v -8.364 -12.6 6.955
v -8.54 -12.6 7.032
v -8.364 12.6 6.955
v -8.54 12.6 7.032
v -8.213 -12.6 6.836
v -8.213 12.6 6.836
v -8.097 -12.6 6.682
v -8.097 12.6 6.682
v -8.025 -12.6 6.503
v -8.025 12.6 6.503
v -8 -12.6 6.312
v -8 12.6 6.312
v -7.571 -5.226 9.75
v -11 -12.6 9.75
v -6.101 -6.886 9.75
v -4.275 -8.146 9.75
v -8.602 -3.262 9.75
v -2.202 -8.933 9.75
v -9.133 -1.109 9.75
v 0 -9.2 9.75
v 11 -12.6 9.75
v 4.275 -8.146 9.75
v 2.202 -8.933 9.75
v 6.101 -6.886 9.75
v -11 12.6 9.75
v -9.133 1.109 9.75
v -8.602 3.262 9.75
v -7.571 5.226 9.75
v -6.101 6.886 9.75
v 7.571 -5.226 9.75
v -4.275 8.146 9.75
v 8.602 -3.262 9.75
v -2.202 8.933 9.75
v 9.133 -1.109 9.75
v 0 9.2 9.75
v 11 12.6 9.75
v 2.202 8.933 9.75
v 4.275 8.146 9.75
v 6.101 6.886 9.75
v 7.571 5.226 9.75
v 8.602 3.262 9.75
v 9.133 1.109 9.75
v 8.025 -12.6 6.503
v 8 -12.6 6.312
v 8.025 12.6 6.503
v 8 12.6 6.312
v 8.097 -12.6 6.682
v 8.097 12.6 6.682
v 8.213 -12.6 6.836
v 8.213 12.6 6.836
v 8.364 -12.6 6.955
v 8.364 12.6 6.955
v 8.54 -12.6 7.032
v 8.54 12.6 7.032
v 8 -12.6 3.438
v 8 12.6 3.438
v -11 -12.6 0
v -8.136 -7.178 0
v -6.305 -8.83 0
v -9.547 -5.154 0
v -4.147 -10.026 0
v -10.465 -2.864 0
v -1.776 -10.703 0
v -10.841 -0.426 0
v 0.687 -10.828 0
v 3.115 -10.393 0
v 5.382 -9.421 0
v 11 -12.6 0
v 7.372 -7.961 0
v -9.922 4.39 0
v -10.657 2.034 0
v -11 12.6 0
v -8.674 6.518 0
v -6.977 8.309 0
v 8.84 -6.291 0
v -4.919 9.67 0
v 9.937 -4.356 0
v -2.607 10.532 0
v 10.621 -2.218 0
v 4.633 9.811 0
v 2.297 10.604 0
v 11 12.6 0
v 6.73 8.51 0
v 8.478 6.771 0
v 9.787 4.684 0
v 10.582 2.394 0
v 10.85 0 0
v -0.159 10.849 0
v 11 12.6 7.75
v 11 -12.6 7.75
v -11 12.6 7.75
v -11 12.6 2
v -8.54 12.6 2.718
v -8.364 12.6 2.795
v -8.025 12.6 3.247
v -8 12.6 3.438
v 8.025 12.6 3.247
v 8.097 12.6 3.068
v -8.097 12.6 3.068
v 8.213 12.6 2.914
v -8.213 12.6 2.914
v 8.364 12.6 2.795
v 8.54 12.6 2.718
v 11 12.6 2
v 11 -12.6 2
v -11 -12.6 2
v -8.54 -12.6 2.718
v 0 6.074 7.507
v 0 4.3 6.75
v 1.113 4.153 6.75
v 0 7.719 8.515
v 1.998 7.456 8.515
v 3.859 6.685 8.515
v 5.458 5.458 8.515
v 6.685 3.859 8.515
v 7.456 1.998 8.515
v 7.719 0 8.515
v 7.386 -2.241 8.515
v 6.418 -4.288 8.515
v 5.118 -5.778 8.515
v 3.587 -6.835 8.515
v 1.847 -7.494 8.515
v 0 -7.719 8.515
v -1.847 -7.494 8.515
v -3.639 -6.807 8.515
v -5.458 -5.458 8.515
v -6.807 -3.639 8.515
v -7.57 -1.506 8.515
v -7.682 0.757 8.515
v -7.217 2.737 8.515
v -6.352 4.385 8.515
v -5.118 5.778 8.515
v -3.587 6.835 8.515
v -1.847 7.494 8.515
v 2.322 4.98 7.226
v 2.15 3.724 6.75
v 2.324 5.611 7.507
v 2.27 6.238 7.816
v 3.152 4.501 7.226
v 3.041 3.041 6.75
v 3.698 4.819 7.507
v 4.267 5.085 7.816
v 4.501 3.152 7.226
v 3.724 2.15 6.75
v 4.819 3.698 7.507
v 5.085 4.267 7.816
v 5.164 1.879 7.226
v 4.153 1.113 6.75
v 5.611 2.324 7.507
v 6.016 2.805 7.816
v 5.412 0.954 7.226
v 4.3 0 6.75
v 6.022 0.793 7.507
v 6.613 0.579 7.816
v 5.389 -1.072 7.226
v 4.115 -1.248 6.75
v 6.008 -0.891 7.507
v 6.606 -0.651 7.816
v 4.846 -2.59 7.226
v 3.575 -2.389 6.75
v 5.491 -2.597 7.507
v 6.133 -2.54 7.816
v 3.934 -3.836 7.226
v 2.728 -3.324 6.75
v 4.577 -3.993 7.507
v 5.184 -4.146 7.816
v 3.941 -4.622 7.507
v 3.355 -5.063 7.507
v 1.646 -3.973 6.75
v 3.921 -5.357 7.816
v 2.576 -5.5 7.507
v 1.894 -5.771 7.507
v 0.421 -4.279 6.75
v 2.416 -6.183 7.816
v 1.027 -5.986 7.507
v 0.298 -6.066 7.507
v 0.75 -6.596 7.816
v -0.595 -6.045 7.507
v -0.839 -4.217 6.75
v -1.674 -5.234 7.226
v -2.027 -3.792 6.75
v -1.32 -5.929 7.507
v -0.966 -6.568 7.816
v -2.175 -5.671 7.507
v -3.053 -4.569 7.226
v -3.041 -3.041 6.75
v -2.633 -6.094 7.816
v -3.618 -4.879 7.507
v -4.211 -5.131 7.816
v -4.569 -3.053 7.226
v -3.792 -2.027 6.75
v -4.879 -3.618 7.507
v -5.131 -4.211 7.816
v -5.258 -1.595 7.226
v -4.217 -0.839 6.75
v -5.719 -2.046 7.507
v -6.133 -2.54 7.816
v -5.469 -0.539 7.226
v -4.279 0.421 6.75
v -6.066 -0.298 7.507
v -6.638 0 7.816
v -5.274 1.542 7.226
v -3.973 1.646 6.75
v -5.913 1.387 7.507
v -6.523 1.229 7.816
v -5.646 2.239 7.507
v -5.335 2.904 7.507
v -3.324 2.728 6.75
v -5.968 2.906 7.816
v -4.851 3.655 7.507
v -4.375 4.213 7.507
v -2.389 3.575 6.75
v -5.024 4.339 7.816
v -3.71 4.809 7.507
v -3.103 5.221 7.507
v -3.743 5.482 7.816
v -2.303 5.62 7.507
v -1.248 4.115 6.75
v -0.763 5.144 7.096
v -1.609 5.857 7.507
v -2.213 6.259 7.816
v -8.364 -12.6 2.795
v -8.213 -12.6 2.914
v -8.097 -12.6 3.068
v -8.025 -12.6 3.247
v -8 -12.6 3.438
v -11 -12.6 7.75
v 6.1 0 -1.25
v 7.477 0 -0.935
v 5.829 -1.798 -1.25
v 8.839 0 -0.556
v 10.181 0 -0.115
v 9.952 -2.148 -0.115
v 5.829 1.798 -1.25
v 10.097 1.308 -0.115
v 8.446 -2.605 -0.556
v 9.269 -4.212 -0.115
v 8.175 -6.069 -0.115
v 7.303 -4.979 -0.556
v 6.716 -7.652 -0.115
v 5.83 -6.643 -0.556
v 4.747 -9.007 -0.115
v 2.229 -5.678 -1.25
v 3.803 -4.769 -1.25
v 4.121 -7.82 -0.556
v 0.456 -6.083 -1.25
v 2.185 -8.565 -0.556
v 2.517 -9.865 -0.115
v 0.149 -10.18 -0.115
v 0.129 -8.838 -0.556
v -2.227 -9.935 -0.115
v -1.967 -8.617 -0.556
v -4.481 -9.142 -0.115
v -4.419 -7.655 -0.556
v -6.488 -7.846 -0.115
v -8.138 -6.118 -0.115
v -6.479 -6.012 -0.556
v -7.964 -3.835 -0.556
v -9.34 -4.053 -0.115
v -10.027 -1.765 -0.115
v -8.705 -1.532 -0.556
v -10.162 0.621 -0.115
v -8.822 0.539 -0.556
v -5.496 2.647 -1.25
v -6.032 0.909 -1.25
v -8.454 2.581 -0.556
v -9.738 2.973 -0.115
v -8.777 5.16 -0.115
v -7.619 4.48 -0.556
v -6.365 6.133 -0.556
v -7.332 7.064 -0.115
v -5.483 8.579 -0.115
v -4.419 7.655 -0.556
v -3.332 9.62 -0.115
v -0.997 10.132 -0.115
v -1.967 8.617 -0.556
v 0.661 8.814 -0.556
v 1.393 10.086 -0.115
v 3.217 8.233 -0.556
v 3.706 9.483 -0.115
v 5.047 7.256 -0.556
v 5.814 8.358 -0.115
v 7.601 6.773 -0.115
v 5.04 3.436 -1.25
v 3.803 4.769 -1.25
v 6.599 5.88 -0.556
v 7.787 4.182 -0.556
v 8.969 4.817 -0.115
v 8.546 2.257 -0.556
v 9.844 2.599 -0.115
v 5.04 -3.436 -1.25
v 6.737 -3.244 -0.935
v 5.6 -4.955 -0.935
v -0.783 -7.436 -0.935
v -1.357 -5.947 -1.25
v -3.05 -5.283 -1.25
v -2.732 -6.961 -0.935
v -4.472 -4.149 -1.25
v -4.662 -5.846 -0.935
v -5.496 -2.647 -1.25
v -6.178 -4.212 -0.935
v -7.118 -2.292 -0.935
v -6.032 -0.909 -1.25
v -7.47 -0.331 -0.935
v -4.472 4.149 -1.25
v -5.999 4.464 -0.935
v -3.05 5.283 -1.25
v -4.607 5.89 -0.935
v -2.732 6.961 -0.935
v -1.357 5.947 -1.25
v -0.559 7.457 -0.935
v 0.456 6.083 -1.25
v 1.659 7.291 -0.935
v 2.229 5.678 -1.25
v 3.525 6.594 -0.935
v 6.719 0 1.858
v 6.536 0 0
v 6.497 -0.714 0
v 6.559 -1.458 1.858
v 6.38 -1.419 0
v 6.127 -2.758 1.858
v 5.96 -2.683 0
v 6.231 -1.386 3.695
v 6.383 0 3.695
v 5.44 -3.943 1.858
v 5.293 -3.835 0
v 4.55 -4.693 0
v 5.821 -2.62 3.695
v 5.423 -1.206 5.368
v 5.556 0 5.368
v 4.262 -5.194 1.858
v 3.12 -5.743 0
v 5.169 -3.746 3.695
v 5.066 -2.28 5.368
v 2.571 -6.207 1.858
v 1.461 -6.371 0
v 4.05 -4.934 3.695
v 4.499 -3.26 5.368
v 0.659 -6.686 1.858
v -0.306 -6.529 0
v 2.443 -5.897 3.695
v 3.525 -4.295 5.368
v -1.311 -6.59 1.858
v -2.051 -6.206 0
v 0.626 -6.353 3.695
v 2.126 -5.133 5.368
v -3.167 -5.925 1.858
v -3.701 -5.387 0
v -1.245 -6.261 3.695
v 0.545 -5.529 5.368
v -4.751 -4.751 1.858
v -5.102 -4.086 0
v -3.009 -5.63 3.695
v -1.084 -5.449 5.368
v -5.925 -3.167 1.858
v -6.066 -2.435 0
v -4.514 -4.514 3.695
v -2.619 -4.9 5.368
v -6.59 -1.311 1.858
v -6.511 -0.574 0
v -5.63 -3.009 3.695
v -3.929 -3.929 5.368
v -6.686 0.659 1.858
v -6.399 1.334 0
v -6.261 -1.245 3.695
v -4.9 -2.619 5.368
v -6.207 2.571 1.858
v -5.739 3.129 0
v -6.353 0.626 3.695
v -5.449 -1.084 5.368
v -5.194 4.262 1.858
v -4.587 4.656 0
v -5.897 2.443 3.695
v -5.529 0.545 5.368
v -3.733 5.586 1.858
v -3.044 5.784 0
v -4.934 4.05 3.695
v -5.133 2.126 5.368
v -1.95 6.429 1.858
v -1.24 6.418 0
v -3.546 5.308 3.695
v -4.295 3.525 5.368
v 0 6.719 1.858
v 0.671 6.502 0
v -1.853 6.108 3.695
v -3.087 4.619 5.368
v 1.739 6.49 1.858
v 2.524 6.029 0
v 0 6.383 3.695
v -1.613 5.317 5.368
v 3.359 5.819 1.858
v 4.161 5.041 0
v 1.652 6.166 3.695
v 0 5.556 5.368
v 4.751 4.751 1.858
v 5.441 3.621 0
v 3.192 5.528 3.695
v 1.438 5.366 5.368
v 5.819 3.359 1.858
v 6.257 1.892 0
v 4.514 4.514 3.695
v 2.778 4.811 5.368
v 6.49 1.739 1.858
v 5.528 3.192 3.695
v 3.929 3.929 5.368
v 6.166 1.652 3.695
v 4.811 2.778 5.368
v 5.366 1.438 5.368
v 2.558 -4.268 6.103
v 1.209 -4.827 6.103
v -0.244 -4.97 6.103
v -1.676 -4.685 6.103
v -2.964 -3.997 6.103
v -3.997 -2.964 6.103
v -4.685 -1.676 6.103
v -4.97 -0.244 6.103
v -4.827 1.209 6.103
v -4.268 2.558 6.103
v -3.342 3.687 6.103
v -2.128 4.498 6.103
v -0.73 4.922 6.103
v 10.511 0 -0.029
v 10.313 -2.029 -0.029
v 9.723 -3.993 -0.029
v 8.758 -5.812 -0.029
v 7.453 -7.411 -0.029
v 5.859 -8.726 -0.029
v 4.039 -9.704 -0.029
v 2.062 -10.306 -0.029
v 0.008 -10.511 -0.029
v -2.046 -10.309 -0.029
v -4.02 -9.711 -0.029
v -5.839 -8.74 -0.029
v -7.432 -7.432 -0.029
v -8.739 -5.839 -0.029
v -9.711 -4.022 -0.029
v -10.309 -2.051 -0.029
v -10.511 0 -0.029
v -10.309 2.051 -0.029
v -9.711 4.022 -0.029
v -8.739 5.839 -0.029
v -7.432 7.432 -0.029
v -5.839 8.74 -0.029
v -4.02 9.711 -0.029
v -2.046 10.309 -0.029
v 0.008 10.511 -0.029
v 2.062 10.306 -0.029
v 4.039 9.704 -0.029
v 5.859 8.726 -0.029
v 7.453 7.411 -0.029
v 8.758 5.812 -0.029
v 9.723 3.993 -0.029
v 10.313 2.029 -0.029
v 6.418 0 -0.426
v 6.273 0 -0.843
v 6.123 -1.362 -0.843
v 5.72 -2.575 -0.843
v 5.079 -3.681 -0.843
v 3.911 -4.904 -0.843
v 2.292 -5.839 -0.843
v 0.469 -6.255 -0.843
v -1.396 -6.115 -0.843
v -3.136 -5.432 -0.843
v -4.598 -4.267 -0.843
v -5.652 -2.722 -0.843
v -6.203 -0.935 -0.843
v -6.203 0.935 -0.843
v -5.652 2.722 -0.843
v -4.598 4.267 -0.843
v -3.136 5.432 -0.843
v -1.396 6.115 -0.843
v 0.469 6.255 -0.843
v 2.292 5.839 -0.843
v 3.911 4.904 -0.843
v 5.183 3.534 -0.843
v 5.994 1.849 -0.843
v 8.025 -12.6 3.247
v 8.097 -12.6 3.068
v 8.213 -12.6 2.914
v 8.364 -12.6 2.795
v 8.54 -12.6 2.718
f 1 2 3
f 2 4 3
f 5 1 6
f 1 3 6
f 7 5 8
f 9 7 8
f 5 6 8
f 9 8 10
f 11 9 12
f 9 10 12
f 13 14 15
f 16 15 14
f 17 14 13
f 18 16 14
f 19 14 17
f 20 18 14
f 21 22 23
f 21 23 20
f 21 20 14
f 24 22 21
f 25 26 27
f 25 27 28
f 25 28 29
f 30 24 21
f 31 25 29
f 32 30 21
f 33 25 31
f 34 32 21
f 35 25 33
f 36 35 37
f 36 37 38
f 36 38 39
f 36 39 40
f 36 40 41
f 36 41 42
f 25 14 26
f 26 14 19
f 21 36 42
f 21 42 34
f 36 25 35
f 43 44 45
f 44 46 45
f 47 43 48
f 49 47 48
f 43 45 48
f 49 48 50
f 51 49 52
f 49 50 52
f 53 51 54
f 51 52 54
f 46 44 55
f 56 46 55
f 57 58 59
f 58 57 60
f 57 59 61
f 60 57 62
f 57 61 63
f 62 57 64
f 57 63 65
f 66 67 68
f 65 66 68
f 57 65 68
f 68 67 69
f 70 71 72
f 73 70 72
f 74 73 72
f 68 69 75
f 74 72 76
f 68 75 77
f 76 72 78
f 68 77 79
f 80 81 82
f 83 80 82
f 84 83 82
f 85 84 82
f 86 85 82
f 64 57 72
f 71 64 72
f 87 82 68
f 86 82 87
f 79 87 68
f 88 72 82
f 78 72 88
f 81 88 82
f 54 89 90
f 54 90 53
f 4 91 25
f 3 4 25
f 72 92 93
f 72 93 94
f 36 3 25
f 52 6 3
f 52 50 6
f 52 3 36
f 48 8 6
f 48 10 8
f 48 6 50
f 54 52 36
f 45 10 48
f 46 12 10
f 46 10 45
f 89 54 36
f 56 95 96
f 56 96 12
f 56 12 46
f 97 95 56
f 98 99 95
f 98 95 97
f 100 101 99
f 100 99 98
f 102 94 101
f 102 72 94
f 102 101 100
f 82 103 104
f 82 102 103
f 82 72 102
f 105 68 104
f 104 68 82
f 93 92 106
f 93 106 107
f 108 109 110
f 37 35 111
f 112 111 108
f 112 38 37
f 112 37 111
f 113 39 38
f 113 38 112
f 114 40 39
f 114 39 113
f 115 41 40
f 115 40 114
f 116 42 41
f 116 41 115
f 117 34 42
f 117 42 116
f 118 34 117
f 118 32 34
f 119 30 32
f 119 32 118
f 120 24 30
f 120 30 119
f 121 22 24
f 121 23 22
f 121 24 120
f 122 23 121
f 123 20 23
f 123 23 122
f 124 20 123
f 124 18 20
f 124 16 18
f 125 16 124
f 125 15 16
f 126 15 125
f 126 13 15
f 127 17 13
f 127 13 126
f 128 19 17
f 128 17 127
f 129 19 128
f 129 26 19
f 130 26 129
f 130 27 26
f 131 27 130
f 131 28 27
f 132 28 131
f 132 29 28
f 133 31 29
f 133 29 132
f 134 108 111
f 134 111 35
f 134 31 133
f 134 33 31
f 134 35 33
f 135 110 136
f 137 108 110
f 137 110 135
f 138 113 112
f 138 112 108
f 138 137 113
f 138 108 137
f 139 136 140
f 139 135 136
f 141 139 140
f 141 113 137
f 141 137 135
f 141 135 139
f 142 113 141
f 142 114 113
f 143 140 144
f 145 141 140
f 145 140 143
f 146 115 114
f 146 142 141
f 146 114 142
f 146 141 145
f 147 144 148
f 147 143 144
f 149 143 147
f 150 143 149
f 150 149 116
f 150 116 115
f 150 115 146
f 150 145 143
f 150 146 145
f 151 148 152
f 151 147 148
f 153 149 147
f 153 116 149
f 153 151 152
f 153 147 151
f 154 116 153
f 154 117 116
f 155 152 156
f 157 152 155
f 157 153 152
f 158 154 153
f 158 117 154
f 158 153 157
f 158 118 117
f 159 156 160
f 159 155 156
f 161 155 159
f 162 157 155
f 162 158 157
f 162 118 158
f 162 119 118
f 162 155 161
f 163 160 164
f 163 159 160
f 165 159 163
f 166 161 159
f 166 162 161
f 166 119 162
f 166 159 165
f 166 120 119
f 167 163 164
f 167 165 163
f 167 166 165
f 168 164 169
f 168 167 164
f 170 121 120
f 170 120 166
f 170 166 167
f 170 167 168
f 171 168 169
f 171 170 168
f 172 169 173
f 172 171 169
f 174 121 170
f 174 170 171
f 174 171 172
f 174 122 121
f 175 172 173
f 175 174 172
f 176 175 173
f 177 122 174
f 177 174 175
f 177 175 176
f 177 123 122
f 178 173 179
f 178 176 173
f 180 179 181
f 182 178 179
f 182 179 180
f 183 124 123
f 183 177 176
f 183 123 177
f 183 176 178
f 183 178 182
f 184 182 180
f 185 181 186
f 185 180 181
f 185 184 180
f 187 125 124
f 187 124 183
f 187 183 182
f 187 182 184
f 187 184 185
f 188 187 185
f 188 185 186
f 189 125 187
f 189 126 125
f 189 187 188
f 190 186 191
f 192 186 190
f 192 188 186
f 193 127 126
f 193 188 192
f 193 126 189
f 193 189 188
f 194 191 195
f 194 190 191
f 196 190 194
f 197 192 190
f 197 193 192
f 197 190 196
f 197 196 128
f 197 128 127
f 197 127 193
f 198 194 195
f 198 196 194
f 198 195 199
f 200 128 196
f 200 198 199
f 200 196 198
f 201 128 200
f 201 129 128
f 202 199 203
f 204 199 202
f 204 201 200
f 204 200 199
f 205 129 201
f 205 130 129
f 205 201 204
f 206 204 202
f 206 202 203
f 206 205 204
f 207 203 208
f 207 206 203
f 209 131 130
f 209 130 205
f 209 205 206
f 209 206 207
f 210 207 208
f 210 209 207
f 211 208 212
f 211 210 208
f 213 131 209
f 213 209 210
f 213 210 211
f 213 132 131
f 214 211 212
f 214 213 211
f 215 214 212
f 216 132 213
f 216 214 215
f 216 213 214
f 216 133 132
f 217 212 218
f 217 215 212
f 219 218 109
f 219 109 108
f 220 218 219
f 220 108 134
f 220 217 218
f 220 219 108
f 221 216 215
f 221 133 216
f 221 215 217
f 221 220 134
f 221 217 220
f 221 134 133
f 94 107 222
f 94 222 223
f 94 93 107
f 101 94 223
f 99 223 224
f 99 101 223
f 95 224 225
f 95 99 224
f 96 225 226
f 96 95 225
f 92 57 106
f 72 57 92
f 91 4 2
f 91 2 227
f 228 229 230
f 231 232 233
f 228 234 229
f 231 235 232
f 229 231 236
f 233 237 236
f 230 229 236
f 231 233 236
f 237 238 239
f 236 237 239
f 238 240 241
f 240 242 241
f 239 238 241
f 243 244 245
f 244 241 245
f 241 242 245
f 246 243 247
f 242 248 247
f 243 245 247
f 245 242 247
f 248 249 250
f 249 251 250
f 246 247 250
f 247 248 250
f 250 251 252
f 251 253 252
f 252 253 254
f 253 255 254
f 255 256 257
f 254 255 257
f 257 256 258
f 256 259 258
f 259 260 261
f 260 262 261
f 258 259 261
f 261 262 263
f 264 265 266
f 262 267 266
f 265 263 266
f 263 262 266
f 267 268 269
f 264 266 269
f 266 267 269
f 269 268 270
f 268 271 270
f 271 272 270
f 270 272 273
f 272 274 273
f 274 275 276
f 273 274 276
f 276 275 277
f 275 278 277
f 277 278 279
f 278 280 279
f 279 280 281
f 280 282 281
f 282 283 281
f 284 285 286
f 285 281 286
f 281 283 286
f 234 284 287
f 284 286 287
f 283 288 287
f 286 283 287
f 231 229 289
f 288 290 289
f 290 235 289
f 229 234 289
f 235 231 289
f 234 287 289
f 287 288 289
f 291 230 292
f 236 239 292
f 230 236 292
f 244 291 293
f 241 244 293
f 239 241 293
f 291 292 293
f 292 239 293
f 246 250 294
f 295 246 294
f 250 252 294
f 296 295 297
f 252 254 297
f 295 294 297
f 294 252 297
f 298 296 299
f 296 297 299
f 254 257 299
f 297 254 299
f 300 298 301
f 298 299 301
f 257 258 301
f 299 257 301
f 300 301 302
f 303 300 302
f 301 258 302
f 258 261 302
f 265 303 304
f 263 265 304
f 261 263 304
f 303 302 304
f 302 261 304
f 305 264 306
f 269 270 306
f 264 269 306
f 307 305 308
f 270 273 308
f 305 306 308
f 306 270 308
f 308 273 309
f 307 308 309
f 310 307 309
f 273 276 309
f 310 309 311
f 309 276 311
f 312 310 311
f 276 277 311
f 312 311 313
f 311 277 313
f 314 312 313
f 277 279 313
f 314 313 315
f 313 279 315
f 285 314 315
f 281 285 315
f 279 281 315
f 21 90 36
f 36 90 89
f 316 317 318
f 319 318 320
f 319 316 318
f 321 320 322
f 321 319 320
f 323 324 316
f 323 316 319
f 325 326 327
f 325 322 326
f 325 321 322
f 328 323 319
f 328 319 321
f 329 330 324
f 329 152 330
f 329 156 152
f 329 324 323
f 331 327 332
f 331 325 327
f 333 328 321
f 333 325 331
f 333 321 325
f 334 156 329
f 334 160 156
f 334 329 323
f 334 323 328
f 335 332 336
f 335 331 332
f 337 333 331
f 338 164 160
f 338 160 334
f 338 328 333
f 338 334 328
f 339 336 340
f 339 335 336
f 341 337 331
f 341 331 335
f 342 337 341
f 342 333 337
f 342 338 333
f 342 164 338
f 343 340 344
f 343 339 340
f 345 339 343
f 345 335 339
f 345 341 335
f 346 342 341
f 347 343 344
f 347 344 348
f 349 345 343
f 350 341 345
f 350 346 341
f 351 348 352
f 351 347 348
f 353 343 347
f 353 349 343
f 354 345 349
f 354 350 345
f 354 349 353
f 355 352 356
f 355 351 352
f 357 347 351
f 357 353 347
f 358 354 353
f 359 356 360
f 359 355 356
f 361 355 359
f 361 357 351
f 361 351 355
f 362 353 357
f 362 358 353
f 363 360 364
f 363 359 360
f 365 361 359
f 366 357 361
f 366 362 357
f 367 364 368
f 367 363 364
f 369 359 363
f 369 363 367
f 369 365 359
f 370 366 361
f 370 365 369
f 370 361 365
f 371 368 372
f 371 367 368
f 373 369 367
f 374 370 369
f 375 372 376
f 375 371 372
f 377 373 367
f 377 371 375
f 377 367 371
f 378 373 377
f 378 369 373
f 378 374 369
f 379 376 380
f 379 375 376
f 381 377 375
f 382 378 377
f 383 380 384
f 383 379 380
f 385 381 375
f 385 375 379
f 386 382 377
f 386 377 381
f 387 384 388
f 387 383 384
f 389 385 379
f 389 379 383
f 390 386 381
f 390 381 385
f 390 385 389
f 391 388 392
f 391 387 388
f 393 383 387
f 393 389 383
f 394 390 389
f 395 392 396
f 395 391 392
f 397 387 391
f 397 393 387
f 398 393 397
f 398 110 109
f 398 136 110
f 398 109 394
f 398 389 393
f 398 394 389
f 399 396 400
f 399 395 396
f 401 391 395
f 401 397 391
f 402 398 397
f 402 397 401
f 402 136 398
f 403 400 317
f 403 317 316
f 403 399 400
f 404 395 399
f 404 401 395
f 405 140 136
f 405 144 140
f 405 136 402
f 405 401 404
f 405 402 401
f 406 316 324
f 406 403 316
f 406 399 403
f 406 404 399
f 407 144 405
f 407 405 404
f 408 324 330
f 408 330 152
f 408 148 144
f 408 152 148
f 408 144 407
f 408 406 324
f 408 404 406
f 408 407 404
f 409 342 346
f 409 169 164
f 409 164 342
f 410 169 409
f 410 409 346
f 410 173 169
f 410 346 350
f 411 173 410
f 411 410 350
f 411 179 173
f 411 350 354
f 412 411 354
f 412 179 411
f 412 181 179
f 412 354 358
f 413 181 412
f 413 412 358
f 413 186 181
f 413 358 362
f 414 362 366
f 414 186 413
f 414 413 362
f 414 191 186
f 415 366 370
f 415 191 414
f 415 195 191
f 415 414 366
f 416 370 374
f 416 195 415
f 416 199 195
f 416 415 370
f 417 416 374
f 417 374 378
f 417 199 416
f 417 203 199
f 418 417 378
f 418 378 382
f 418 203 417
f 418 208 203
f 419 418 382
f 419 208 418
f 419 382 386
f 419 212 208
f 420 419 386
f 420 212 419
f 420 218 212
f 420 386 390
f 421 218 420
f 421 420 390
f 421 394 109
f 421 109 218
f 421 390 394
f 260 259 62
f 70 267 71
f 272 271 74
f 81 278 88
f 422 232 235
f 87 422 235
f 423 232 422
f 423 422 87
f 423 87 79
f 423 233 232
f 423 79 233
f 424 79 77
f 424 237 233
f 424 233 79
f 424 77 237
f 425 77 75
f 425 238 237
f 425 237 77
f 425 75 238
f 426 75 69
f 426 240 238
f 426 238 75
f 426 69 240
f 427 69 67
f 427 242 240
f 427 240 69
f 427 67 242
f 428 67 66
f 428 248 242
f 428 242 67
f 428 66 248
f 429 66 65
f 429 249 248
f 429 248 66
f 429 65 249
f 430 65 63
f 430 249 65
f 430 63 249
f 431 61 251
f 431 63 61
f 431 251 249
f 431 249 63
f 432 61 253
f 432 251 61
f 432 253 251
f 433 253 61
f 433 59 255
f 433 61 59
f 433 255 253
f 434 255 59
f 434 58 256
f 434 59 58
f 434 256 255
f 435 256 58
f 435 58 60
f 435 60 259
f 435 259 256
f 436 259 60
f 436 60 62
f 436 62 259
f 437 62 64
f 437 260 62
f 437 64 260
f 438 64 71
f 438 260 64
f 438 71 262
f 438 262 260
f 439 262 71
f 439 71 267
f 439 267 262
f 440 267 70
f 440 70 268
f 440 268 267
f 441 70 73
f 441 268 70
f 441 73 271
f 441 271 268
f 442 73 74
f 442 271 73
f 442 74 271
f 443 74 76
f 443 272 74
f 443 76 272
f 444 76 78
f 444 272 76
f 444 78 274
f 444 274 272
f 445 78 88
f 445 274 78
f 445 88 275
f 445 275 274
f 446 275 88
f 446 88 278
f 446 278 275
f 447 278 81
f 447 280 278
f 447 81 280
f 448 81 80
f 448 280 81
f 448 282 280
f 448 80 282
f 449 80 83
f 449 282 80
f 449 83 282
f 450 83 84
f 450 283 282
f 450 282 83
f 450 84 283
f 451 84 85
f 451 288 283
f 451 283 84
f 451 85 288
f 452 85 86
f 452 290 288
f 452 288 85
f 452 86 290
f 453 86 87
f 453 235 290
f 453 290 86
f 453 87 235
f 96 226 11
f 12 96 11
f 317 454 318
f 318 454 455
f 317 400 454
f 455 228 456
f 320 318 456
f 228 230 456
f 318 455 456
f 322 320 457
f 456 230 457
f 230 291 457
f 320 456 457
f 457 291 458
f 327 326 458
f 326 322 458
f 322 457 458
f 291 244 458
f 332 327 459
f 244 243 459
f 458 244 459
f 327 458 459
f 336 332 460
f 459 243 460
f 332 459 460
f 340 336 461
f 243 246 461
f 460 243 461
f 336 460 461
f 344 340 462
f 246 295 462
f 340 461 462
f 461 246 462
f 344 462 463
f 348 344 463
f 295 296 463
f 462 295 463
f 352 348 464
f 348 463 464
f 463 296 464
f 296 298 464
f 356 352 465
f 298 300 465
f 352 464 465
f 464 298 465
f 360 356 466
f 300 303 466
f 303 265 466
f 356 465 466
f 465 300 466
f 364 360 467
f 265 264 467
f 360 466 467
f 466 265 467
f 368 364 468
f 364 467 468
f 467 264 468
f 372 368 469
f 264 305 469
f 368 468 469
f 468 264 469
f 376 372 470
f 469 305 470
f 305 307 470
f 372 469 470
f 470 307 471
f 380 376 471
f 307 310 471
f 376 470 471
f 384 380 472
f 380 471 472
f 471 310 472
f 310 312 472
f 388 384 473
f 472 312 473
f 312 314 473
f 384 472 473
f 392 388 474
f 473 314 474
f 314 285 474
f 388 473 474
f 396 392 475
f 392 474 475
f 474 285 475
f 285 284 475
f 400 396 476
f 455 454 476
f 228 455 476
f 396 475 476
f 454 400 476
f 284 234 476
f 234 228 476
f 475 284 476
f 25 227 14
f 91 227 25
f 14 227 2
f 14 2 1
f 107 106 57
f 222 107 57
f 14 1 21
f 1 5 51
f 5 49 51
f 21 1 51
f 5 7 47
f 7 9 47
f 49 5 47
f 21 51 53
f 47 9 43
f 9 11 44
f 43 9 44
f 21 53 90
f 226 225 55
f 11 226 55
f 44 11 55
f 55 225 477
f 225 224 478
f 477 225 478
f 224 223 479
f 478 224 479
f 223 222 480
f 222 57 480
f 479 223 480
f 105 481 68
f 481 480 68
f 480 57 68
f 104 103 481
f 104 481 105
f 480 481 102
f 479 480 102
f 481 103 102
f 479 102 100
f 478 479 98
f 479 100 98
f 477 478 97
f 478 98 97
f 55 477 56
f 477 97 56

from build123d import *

# Parameters (mm, degrees)
F0_W     = 22
F0_H     = 25.2
F1_DEPTH = 9.75
F3_DEPTH = 25.2
F12_R    = 2
F13_R    = 0.75


with BuildPart() as f1:
    # F0 (on Top) → F1 (new body)
    with BuildSketch(Plane.XY):
        Rectangle(F0_W, F0_H)
    extrude(amount=F1_DEPTH)

    # F2 (on face) → F3 (cut, through all)
    with BuildSketch(Plane.XZ.offset(12.6)):
        Polygon((-8, 2.875), (-8, 6.875), (-11, 7.75), (-11, 2), align=None)
        Polygon((11, 7.75), (8, 6.875), (8, 2.875), (11, 2), align=None)
    extrude(amount=-F3_DEPTH, mode=Mode.SUBTRACT)

    # F4 (on Right) → F5 (revolve, cut)
    with BuildSketch(Plane.YZ):
        with BuildLine():
            Line((0, 9.75), (0, 6.75))
            Line((0, 6.75), (4.3, 6.75))
            ThreePointArc((4.3, 6.75), (6.914658, 7.981058), (9.2, 9.75))
            Line((9.2, 9.75), (0, 9.75))
        make_face()
    revolve(axis=Axis((0, 0, 8.25), (0, 0, -1)), mode=Mode.SUBTRACT)

    # F6 (on Front) → F7 (revolve, cut)
    with BuildSketch(Plane.XZ):
        with BuildLine():
            Line((0, -1.25), (6.1, -1.25))
            ThreePointArc((6.1, -1.25), (5.667858, 5.198602), (0, 8.3045))
            Line((0, 8.3045), (0, -1.25))
        make_face()
    revolve(axis=Axis((0, 0, 3.52725), (0, 0, -1)), mode=Mode.SUBTRACT)

    # F6 (on Front) → F10 (revolve, cut)
    with BuildSketch(Plane.XZ):
        with BuildLine():
            Line((0, -1.25), (6.1, -1.25))
            ThreePointArc((6.1, -1.25), (5.667858, 5.198602), (0, 8.3045))
            Line((0, 8.3045), (0, -1.25))
        make_face()
    revolve(axis=Axis((0, 0, 3.490293), (0, 0, -1)), mode=Mode.SUBTRACT)

    # F8 (on Front) → F11 (revolve)
    with BuildSketch(Plane.XZ):
        with BuildLine():
            ThreePointArc((6.536245, 0), (6.34896, -0.635762), (6.1, -1.25))
            ThreePointArc((6.1, -1.25), (8.323498, -0.707714), (10.5, 0))
            Line((10.5, 0), (6.536245, 0))
        make_face()
    revolve(axis=Axis((0, 0, 3.52725), (0, 0, -1)))

    # F12
    f12_edges = [f1.edges().sort_by_distance(p)[0] for p in [
        (-10.5, 0, 0),
    ]]
    fillet(f12_edges, radius=F12_R)

    # F13
    f13_edges = [f1.edges().sort_by_distance(p)[0] for p in [
        (8, 0, 2.875),
        (8, 0, 6.875),
        (-8, 0, 6.875),
        (-8, 0, 2.875),
    ]]
    fillet(f13_edges, radius=F13_R)


solid = f1.part
